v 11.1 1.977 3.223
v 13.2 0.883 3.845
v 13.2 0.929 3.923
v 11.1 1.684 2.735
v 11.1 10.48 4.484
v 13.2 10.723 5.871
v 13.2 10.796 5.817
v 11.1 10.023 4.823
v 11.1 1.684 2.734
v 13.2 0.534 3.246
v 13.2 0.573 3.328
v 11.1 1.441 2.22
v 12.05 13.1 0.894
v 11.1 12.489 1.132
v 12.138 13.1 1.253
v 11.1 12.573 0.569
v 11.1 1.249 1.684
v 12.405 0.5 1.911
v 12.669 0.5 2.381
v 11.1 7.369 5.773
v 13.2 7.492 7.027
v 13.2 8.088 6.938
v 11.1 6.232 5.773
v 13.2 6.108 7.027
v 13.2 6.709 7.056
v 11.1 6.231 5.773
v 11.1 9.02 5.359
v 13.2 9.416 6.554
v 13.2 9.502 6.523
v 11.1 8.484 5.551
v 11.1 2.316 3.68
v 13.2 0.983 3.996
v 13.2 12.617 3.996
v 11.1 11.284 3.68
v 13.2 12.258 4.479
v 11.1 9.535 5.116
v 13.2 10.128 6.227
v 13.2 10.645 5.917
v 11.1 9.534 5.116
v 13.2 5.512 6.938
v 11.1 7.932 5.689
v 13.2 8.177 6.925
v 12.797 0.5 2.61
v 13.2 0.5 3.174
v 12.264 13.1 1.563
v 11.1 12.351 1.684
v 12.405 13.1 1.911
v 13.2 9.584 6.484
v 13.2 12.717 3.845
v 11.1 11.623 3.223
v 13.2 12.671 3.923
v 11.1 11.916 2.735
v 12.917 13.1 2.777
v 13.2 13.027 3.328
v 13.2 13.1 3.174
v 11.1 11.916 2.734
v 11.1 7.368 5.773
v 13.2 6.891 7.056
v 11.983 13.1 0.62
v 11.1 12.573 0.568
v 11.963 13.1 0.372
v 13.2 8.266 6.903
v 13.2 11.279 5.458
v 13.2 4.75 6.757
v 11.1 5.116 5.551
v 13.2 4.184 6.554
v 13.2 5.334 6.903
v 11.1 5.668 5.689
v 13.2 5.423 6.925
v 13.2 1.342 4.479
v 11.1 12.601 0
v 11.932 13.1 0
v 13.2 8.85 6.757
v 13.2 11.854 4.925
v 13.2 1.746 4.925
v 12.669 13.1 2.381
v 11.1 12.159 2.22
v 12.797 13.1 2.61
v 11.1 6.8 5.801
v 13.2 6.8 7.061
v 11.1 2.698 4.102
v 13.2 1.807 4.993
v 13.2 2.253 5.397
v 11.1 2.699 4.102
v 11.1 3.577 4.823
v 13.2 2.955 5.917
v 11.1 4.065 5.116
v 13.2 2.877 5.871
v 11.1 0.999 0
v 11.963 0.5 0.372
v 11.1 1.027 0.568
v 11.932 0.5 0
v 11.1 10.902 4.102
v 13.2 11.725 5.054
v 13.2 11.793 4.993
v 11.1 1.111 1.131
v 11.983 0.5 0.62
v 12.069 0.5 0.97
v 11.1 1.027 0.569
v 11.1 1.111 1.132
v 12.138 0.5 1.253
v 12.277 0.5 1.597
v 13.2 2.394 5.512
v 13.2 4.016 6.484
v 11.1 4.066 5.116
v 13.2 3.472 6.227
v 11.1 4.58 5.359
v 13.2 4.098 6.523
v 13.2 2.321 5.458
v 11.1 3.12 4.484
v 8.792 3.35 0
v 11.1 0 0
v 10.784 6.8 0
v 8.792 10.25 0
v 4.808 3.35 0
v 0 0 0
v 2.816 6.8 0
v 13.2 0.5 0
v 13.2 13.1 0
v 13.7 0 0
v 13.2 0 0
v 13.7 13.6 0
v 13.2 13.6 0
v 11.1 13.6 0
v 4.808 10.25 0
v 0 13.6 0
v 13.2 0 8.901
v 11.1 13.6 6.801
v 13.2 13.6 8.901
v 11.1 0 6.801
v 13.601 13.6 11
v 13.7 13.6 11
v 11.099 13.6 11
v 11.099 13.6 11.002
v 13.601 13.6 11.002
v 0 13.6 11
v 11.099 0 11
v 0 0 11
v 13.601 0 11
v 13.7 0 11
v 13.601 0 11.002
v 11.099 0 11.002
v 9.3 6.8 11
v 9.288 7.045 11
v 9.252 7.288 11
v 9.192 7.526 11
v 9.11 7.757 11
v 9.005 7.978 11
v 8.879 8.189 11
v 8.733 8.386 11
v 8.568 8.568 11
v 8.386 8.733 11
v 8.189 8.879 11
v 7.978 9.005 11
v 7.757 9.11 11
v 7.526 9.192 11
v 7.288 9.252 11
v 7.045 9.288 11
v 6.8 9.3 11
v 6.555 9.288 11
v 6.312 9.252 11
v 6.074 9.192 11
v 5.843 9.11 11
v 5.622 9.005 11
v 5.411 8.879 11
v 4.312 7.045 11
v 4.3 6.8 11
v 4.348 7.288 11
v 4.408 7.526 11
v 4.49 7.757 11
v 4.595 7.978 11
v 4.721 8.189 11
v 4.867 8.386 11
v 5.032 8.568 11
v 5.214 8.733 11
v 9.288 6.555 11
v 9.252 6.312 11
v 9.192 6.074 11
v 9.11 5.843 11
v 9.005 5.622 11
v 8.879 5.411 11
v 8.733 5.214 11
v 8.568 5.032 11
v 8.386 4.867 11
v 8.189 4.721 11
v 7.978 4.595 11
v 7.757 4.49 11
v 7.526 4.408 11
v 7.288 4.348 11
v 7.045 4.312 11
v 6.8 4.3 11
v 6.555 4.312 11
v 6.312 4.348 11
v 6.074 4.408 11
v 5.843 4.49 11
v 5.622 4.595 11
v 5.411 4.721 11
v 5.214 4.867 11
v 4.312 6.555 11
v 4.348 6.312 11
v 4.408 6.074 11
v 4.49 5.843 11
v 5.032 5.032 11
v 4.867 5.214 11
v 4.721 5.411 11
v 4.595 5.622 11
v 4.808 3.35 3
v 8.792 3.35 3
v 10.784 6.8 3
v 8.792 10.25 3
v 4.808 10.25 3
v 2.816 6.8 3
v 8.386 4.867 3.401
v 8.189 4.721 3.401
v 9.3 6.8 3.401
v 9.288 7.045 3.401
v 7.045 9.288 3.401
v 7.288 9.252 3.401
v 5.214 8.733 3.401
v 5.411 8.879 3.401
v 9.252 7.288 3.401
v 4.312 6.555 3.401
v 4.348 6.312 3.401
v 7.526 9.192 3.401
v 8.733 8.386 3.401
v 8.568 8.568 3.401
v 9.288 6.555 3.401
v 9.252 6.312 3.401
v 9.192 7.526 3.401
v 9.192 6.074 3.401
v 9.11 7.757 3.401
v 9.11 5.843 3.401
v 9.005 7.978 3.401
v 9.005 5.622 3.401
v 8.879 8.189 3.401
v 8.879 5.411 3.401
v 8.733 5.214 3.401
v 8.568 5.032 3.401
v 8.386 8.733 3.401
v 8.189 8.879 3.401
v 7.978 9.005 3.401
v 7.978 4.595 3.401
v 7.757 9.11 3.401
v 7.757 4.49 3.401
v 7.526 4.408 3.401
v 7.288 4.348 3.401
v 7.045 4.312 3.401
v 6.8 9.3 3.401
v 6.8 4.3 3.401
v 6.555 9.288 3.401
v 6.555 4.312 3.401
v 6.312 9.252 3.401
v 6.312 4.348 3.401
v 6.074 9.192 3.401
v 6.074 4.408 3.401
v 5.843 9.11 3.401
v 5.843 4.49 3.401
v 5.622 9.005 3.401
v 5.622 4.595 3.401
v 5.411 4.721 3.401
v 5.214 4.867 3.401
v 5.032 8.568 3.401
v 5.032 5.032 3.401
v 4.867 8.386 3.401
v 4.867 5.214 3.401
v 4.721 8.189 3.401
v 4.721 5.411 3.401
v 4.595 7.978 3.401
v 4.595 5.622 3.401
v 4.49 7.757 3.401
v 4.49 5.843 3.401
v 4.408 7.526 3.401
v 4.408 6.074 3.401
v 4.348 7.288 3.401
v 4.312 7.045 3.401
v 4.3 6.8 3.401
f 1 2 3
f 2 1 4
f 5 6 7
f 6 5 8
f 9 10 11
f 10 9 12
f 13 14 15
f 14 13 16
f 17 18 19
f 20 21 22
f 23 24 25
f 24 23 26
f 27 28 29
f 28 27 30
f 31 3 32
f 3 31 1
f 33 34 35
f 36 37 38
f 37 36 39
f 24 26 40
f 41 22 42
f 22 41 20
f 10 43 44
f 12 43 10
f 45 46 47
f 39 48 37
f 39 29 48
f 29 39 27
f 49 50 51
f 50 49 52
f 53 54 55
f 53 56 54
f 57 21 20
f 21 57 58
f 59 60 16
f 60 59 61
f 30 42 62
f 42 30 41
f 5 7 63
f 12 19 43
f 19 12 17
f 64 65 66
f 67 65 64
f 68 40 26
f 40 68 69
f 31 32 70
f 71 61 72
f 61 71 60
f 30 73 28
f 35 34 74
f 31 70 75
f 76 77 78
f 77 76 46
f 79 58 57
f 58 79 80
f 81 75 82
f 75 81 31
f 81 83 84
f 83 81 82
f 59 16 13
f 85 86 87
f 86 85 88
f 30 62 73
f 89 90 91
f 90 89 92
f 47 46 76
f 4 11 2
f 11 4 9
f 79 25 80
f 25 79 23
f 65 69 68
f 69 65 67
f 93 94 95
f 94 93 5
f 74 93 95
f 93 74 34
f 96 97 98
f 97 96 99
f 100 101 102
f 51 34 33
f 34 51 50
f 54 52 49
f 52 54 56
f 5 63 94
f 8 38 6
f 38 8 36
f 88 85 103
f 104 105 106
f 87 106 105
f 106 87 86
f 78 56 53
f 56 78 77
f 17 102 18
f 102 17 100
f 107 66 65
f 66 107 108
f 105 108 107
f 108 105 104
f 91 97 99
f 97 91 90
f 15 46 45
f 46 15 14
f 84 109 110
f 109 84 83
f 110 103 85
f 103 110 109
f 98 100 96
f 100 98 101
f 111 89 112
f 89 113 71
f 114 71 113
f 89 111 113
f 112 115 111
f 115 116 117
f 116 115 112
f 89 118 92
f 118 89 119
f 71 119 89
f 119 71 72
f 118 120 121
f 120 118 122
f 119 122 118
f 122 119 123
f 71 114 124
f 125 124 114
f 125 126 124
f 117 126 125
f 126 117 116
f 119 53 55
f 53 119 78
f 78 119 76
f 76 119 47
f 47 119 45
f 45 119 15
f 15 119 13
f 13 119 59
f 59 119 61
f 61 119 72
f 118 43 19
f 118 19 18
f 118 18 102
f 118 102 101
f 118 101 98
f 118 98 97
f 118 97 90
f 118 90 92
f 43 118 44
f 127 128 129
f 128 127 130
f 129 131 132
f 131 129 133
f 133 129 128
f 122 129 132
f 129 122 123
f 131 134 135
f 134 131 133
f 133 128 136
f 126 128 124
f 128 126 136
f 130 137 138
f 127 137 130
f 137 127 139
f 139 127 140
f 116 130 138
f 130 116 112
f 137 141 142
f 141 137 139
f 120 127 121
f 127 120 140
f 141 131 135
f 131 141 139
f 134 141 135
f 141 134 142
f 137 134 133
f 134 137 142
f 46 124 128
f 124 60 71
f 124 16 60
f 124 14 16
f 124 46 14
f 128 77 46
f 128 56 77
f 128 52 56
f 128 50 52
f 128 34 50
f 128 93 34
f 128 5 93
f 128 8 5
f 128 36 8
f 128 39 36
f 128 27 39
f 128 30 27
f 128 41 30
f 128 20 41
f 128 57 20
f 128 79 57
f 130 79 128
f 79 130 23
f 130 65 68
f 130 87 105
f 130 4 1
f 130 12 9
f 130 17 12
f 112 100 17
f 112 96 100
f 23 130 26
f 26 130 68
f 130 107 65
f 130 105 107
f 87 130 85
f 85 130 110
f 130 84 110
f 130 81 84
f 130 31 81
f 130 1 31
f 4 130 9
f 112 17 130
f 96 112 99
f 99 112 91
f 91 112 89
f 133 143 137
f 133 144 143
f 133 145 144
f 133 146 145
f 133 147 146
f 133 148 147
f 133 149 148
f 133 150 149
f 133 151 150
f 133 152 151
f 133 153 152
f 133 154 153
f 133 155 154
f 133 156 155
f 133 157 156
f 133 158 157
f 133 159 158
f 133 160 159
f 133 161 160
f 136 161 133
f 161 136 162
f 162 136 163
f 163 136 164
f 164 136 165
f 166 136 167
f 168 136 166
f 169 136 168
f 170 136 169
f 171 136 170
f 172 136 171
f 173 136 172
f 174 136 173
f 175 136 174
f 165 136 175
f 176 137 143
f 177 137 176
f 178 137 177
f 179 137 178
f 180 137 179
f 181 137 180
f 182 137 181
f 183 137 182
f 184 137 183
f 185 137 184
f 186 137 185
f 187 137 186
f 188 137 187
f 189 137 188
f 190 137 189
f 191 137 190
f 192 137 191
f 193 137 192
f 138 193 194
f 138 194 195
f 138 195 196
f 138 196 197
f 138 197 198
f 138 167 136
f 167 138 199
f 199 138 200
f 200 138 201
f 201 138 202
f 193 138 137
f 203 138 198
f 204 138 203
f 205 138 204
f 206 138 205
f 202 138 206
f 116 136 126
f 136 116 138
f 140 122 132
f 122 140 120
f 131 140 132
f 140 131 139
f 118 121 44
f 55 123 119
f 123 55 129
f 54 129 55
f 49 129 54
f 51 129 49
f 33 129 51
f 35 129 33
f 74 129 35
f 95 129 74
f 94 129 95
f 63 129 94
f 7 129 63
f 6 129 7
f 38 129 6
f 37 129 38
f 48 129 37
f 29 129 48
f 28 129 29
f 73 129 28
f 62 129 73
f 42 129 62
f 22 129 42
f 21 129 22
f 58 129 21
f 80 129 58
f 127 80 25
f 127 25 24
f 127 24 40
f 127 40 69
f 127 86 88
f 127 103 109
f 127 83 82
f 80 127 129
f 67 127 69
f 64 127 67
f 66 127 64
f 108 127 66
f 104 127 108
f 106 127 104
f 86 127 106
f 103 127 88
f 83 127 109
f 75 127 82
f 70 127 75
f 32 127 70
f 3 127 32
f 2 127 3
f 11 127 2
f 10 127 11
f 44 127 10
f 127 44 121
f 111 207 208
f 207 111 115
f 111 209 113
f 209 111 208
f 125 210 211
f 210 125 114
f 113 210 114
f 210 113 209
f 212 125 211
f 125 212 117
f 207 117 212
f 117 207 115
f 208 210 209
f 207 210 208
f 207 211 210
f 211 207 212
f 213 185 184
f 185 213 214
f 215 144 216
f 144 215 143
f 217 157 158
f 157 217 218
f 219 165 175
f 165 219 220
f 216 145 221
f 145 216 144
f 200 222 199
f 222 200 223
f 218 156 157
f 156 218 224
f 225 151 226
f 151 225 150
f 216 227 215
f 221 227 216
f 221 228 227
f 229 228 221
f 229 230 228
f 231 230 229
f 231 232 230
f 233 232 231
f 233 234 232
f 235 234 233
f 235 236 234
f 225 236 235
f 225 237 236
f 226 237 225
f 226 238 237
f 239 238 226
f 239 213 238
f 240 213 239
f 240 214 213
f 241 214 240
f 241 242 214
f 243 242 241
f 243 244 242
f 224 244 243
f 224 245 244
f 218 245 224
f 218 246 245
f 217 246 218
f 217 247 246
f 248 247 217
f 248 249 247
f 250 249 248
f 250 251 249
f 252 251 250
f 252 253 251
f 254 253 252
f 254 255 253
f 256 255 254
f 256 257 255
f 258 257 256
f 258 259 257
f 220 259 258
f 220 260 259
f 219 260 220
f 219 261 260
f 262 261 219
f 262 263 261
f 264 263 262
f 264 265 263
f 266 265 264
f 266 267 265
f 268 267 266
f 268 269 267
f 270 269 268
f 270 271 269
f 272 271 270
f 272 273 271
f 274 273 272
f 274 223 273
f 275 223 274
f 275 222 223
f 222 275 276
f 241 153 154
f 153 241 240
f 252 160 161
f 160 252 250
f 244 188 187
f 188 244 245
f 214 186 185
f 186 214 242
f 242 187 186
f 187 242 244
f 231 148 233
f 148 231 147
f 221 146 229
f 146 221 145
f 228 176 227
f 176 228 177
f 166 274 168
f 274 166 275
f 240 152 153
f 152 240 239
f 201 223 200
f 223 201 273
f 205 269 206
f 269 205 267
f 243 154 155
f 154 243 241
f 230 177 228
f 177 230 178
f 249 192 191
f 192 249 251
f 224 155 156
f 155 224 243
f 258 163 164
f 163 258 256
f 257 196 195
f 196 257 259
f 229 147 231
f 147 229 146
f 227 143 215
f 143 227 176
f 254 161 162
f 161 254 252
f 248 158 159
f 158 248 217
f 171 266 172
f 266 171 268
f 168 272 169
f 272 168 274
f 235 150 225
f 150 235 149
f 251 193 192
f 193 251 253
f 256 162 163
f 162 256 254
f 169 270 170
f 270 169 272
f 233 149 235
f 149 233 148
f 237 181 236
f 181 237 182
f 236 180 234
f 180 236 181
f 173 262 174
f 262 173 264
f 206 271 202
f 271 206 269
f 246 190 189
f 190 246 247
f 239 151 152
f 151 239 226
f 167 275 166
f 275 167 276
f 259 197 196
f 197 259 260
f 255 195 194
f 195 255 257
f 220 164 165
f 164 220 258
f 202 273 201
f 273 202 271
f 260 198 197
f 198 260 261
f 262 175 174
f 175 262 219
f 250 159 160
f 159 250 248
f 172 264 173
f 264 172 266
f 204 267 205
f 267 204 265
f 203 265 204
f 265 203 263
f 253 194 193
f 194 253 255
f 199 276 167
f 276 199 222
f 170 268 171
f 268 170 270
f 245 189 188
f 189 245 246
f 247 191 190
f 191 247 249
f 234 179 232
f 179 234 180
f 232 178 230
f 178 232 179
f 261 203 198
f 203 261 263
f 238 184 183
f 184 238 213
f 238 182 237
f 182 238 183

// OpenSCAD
// file: configuration.scad
/*
 * Igor Soares' parallel kinematic XY
 * Configuration
 * (C) 2014 by Ígor Bruno Pereira Soares
 *
 * This project is free: you can redistribute it and/or modify
 * it under the terms of the GNU General Public License as published by
 * the Free Software Foundation, either version 2 of the License, or
 * (at your option) any later version.
 *
 * This project is distributed in the hope that it will be useful,
 * but WITHOUT ANY WARRANTY; without even the implied warranty of
 * MERCHANTABILITY or FITNESS FOR A PARTICULAR PURPOSE.  See the
 * GNU General Public License for more details.
 *
 * You should have received a copy of the GNU General Public License
 * along with this project.  If not, see <http://www.gnu.org/licenses/>.
 */

LIGHT_WALL_WIDTH = 2.01;
WALL_WIDTH = 5.0;
VERTICAL_SUPPORT_WALL = 0.5;
HORIZONTAL_SUPPORT_WALL = 0.255;

BEARING_DIAMETER = 22.4;
BEARING_WIDTH = 7;
BEARING_SCREW_DIAMETER = 8.2;
BEARING_SCREW_NUT_WIDTH = 13;

LINEAR_BUSHING_DIAMETER = 15.3;
LINEAR_BUSHING_LEN = 24.4;
LINEAR_BUSHING_WALL = 1.0;

INNER_BEARING_SCREW_DISTANCE_TO_ROD = VERTICAL_SUPPORT_WALL;
INNER_BEARING_POS = 15;

SPACING_TO_BEARING = 18.0;
ROD_ACTUAL_DIAMETER = 8.0;
ROD_HOLE_DIAMETER = 8.4;

ROD_CLAMP_SCREW_DIAMETER = 4.8+ 0.3;
ROD_CLAMP_SCREW_NUT_WIDTH = 6.7;
ROD_CLAMP_SCREW_NUT_H = 3.5;
ROD_CLAMP_GAP = 1.0;

FRAME_ROD_DIAMETER = 8.4;
FRAME_VERTICE_WALL_WIDTH = 3.5;

WIRE_END_SCREW_DIAMETER = 4.8 + 0.3; // 3/16 + tolerance

MOTOR_SCREW_DIAMETER = 3.4;
MOTOR_SCREW_MOUNT = 31; // nema 17
MOTOR_SIZE = 43;
MOTOR_MOUNT_INNER_DIAMETER = 30;
MOTOR_BELT_CLEARANCE = 5;

MOTOR_SUPPORT_SCREW_DIAMETER = 4.8 + 0.3; // 3/16 + tolerance
MOTOR_SUPPORT_SCREWS_DISTANCE = 40;

BEARING_GUIDE_H = 7;
BEARING_GUIDE_ANGLE = 30;

ST = 0.001;
// main file
/*
 * Igor Soares' parallel kinematic XY
 * Sliding blockscren tensioner
 * (C) 2014 by Ígor Bruno Pereira Soares
 *
 * This project is free: you can redistribute it and/or modify
 * it under the terms of the GNU General Public License as published by
 * the Free Software Foundation, either version 2 of the License, or
 * (at your option) any later version.
 *
 * This project is distributed in the hope that it will be useful,
 * but WITHOUT ANY WARRANTY; without even the implied warranty of
 * MERCHANTABILITY or FITNESS FOR A PARTICULAR PURPOSE.  See the
 * GNU General Public License for more details.
 *
 * You should have received a copy of the GNU General Public License
 * along with this project.  If not, see <http://www.gnu.org/licenses/>.
 */
include <configuration.scad>

tensioner($fn=64);
//screw_hosing($fn=64);

module tensioner(
    strech_support_width=2*WALL_WIDTH+ 4.0 - 0.4,
    width= 11,
    vmin=0.5,
    hsupp=0.4 + ST,
    screw_r=5.0/2,
    screw_nut_width=6.9,
    screw_nut_h=3,
    wire_grip_w=2.5,
    wire_grip_r1=(2*WALL_WIDTH + 5.0 - 0.4)/2 - 1.5,
    wire_grip_r2=(2*WALL_WIDTH + 5.0 - 0.4)/2  + 0,
    wire_upper_space=1,
    wire_lat_space=0.5)
{
  difference() {
    union() {
      cube([strech_support_width - wire_grip_w,
            strech_support_width,
            width]);

      translate([strech_support_width -vmin + 0.1,0,0])
      cube([vmin,
            strech_support_width,
            width]);

      intersection() {
        translate([strech_support_width - wire_grip_w -ST,
                   strech_support_width/2,
                   0])
          rotate([0,90,0])
            cylinder(r1=wire_grip_r1, r2=wire_grip_r2, h=wire_grip_w);
        translate([strech_support_width - wire_grip_w -ST, wire_lat_space, 0])
          cube([wire_grip_w +2*ST,
                strech_support_width - 2*wire_lat_space,
                wire_grip_r2 + 2*ST]);
      }
      intersection() {
        translate([strech_support_width - wire_grip_w -ST,
                   0,
                   wire_grip_r1 + wire_upper_space])
          rotate([0,-45,0])
            cube([strech_support_width*sqrt(2),
                  strech_support_width,
                  strech_support_width*sqrt(2)]);
        translate([strech_support_width - wire_grip_w -ST, 0, 0])
          cube([wire_grip_w +2*ST, strech_support_width, width + 2*ST]);
      }
    }
    translate([strech_support_width/2, strech_support_width/2, -1])
      #cylinder(r=screw_nut_width/(2*cos(30)), h=screw_nut_h +1, $fn=6);
    translate([strech_support_width/2, strech_support_width/2,
               screw_nut_h + hsupp])
      #cylinder(r=screw_r, h=width +2);
  }
}

module screw_hosing(
  screw_r=4.4/2,
  screw_nut_w=6.9,
  screw_nut_h=3,
  screw_nut_access_hole=10.5,
  wall=4.5,
  lower_wall=2,
  grip_hole=0.8,
  h=5.1)
{
  nut_r = screw_nut_w/sqrt(3);
  n_g = floor( 3.1415*(screw_r + wall)/(2*grip_hole) );

  difference() {
    union() {
      cylinder(r=screw_r + wall, h=h);
    }
    translate([0,0,-1])
      #cylinder(r=screw_r, h=h+2);
    translate([0,0,lower_wall])
      #cylinder(r=nut_r, h=h, $fn=6);
    translate([0, 0, lower_wall + screw_nut_h])
      #cylinder(r=screw_nut_access_hole/2, h=h);

    for(i=[1:n_g]) rotate([0,0,(360/n_g)*i])
      translate([screw_r + wall, 0, -1])
        #cylinder(r=grip_hole, h=h+2);
  }
}
